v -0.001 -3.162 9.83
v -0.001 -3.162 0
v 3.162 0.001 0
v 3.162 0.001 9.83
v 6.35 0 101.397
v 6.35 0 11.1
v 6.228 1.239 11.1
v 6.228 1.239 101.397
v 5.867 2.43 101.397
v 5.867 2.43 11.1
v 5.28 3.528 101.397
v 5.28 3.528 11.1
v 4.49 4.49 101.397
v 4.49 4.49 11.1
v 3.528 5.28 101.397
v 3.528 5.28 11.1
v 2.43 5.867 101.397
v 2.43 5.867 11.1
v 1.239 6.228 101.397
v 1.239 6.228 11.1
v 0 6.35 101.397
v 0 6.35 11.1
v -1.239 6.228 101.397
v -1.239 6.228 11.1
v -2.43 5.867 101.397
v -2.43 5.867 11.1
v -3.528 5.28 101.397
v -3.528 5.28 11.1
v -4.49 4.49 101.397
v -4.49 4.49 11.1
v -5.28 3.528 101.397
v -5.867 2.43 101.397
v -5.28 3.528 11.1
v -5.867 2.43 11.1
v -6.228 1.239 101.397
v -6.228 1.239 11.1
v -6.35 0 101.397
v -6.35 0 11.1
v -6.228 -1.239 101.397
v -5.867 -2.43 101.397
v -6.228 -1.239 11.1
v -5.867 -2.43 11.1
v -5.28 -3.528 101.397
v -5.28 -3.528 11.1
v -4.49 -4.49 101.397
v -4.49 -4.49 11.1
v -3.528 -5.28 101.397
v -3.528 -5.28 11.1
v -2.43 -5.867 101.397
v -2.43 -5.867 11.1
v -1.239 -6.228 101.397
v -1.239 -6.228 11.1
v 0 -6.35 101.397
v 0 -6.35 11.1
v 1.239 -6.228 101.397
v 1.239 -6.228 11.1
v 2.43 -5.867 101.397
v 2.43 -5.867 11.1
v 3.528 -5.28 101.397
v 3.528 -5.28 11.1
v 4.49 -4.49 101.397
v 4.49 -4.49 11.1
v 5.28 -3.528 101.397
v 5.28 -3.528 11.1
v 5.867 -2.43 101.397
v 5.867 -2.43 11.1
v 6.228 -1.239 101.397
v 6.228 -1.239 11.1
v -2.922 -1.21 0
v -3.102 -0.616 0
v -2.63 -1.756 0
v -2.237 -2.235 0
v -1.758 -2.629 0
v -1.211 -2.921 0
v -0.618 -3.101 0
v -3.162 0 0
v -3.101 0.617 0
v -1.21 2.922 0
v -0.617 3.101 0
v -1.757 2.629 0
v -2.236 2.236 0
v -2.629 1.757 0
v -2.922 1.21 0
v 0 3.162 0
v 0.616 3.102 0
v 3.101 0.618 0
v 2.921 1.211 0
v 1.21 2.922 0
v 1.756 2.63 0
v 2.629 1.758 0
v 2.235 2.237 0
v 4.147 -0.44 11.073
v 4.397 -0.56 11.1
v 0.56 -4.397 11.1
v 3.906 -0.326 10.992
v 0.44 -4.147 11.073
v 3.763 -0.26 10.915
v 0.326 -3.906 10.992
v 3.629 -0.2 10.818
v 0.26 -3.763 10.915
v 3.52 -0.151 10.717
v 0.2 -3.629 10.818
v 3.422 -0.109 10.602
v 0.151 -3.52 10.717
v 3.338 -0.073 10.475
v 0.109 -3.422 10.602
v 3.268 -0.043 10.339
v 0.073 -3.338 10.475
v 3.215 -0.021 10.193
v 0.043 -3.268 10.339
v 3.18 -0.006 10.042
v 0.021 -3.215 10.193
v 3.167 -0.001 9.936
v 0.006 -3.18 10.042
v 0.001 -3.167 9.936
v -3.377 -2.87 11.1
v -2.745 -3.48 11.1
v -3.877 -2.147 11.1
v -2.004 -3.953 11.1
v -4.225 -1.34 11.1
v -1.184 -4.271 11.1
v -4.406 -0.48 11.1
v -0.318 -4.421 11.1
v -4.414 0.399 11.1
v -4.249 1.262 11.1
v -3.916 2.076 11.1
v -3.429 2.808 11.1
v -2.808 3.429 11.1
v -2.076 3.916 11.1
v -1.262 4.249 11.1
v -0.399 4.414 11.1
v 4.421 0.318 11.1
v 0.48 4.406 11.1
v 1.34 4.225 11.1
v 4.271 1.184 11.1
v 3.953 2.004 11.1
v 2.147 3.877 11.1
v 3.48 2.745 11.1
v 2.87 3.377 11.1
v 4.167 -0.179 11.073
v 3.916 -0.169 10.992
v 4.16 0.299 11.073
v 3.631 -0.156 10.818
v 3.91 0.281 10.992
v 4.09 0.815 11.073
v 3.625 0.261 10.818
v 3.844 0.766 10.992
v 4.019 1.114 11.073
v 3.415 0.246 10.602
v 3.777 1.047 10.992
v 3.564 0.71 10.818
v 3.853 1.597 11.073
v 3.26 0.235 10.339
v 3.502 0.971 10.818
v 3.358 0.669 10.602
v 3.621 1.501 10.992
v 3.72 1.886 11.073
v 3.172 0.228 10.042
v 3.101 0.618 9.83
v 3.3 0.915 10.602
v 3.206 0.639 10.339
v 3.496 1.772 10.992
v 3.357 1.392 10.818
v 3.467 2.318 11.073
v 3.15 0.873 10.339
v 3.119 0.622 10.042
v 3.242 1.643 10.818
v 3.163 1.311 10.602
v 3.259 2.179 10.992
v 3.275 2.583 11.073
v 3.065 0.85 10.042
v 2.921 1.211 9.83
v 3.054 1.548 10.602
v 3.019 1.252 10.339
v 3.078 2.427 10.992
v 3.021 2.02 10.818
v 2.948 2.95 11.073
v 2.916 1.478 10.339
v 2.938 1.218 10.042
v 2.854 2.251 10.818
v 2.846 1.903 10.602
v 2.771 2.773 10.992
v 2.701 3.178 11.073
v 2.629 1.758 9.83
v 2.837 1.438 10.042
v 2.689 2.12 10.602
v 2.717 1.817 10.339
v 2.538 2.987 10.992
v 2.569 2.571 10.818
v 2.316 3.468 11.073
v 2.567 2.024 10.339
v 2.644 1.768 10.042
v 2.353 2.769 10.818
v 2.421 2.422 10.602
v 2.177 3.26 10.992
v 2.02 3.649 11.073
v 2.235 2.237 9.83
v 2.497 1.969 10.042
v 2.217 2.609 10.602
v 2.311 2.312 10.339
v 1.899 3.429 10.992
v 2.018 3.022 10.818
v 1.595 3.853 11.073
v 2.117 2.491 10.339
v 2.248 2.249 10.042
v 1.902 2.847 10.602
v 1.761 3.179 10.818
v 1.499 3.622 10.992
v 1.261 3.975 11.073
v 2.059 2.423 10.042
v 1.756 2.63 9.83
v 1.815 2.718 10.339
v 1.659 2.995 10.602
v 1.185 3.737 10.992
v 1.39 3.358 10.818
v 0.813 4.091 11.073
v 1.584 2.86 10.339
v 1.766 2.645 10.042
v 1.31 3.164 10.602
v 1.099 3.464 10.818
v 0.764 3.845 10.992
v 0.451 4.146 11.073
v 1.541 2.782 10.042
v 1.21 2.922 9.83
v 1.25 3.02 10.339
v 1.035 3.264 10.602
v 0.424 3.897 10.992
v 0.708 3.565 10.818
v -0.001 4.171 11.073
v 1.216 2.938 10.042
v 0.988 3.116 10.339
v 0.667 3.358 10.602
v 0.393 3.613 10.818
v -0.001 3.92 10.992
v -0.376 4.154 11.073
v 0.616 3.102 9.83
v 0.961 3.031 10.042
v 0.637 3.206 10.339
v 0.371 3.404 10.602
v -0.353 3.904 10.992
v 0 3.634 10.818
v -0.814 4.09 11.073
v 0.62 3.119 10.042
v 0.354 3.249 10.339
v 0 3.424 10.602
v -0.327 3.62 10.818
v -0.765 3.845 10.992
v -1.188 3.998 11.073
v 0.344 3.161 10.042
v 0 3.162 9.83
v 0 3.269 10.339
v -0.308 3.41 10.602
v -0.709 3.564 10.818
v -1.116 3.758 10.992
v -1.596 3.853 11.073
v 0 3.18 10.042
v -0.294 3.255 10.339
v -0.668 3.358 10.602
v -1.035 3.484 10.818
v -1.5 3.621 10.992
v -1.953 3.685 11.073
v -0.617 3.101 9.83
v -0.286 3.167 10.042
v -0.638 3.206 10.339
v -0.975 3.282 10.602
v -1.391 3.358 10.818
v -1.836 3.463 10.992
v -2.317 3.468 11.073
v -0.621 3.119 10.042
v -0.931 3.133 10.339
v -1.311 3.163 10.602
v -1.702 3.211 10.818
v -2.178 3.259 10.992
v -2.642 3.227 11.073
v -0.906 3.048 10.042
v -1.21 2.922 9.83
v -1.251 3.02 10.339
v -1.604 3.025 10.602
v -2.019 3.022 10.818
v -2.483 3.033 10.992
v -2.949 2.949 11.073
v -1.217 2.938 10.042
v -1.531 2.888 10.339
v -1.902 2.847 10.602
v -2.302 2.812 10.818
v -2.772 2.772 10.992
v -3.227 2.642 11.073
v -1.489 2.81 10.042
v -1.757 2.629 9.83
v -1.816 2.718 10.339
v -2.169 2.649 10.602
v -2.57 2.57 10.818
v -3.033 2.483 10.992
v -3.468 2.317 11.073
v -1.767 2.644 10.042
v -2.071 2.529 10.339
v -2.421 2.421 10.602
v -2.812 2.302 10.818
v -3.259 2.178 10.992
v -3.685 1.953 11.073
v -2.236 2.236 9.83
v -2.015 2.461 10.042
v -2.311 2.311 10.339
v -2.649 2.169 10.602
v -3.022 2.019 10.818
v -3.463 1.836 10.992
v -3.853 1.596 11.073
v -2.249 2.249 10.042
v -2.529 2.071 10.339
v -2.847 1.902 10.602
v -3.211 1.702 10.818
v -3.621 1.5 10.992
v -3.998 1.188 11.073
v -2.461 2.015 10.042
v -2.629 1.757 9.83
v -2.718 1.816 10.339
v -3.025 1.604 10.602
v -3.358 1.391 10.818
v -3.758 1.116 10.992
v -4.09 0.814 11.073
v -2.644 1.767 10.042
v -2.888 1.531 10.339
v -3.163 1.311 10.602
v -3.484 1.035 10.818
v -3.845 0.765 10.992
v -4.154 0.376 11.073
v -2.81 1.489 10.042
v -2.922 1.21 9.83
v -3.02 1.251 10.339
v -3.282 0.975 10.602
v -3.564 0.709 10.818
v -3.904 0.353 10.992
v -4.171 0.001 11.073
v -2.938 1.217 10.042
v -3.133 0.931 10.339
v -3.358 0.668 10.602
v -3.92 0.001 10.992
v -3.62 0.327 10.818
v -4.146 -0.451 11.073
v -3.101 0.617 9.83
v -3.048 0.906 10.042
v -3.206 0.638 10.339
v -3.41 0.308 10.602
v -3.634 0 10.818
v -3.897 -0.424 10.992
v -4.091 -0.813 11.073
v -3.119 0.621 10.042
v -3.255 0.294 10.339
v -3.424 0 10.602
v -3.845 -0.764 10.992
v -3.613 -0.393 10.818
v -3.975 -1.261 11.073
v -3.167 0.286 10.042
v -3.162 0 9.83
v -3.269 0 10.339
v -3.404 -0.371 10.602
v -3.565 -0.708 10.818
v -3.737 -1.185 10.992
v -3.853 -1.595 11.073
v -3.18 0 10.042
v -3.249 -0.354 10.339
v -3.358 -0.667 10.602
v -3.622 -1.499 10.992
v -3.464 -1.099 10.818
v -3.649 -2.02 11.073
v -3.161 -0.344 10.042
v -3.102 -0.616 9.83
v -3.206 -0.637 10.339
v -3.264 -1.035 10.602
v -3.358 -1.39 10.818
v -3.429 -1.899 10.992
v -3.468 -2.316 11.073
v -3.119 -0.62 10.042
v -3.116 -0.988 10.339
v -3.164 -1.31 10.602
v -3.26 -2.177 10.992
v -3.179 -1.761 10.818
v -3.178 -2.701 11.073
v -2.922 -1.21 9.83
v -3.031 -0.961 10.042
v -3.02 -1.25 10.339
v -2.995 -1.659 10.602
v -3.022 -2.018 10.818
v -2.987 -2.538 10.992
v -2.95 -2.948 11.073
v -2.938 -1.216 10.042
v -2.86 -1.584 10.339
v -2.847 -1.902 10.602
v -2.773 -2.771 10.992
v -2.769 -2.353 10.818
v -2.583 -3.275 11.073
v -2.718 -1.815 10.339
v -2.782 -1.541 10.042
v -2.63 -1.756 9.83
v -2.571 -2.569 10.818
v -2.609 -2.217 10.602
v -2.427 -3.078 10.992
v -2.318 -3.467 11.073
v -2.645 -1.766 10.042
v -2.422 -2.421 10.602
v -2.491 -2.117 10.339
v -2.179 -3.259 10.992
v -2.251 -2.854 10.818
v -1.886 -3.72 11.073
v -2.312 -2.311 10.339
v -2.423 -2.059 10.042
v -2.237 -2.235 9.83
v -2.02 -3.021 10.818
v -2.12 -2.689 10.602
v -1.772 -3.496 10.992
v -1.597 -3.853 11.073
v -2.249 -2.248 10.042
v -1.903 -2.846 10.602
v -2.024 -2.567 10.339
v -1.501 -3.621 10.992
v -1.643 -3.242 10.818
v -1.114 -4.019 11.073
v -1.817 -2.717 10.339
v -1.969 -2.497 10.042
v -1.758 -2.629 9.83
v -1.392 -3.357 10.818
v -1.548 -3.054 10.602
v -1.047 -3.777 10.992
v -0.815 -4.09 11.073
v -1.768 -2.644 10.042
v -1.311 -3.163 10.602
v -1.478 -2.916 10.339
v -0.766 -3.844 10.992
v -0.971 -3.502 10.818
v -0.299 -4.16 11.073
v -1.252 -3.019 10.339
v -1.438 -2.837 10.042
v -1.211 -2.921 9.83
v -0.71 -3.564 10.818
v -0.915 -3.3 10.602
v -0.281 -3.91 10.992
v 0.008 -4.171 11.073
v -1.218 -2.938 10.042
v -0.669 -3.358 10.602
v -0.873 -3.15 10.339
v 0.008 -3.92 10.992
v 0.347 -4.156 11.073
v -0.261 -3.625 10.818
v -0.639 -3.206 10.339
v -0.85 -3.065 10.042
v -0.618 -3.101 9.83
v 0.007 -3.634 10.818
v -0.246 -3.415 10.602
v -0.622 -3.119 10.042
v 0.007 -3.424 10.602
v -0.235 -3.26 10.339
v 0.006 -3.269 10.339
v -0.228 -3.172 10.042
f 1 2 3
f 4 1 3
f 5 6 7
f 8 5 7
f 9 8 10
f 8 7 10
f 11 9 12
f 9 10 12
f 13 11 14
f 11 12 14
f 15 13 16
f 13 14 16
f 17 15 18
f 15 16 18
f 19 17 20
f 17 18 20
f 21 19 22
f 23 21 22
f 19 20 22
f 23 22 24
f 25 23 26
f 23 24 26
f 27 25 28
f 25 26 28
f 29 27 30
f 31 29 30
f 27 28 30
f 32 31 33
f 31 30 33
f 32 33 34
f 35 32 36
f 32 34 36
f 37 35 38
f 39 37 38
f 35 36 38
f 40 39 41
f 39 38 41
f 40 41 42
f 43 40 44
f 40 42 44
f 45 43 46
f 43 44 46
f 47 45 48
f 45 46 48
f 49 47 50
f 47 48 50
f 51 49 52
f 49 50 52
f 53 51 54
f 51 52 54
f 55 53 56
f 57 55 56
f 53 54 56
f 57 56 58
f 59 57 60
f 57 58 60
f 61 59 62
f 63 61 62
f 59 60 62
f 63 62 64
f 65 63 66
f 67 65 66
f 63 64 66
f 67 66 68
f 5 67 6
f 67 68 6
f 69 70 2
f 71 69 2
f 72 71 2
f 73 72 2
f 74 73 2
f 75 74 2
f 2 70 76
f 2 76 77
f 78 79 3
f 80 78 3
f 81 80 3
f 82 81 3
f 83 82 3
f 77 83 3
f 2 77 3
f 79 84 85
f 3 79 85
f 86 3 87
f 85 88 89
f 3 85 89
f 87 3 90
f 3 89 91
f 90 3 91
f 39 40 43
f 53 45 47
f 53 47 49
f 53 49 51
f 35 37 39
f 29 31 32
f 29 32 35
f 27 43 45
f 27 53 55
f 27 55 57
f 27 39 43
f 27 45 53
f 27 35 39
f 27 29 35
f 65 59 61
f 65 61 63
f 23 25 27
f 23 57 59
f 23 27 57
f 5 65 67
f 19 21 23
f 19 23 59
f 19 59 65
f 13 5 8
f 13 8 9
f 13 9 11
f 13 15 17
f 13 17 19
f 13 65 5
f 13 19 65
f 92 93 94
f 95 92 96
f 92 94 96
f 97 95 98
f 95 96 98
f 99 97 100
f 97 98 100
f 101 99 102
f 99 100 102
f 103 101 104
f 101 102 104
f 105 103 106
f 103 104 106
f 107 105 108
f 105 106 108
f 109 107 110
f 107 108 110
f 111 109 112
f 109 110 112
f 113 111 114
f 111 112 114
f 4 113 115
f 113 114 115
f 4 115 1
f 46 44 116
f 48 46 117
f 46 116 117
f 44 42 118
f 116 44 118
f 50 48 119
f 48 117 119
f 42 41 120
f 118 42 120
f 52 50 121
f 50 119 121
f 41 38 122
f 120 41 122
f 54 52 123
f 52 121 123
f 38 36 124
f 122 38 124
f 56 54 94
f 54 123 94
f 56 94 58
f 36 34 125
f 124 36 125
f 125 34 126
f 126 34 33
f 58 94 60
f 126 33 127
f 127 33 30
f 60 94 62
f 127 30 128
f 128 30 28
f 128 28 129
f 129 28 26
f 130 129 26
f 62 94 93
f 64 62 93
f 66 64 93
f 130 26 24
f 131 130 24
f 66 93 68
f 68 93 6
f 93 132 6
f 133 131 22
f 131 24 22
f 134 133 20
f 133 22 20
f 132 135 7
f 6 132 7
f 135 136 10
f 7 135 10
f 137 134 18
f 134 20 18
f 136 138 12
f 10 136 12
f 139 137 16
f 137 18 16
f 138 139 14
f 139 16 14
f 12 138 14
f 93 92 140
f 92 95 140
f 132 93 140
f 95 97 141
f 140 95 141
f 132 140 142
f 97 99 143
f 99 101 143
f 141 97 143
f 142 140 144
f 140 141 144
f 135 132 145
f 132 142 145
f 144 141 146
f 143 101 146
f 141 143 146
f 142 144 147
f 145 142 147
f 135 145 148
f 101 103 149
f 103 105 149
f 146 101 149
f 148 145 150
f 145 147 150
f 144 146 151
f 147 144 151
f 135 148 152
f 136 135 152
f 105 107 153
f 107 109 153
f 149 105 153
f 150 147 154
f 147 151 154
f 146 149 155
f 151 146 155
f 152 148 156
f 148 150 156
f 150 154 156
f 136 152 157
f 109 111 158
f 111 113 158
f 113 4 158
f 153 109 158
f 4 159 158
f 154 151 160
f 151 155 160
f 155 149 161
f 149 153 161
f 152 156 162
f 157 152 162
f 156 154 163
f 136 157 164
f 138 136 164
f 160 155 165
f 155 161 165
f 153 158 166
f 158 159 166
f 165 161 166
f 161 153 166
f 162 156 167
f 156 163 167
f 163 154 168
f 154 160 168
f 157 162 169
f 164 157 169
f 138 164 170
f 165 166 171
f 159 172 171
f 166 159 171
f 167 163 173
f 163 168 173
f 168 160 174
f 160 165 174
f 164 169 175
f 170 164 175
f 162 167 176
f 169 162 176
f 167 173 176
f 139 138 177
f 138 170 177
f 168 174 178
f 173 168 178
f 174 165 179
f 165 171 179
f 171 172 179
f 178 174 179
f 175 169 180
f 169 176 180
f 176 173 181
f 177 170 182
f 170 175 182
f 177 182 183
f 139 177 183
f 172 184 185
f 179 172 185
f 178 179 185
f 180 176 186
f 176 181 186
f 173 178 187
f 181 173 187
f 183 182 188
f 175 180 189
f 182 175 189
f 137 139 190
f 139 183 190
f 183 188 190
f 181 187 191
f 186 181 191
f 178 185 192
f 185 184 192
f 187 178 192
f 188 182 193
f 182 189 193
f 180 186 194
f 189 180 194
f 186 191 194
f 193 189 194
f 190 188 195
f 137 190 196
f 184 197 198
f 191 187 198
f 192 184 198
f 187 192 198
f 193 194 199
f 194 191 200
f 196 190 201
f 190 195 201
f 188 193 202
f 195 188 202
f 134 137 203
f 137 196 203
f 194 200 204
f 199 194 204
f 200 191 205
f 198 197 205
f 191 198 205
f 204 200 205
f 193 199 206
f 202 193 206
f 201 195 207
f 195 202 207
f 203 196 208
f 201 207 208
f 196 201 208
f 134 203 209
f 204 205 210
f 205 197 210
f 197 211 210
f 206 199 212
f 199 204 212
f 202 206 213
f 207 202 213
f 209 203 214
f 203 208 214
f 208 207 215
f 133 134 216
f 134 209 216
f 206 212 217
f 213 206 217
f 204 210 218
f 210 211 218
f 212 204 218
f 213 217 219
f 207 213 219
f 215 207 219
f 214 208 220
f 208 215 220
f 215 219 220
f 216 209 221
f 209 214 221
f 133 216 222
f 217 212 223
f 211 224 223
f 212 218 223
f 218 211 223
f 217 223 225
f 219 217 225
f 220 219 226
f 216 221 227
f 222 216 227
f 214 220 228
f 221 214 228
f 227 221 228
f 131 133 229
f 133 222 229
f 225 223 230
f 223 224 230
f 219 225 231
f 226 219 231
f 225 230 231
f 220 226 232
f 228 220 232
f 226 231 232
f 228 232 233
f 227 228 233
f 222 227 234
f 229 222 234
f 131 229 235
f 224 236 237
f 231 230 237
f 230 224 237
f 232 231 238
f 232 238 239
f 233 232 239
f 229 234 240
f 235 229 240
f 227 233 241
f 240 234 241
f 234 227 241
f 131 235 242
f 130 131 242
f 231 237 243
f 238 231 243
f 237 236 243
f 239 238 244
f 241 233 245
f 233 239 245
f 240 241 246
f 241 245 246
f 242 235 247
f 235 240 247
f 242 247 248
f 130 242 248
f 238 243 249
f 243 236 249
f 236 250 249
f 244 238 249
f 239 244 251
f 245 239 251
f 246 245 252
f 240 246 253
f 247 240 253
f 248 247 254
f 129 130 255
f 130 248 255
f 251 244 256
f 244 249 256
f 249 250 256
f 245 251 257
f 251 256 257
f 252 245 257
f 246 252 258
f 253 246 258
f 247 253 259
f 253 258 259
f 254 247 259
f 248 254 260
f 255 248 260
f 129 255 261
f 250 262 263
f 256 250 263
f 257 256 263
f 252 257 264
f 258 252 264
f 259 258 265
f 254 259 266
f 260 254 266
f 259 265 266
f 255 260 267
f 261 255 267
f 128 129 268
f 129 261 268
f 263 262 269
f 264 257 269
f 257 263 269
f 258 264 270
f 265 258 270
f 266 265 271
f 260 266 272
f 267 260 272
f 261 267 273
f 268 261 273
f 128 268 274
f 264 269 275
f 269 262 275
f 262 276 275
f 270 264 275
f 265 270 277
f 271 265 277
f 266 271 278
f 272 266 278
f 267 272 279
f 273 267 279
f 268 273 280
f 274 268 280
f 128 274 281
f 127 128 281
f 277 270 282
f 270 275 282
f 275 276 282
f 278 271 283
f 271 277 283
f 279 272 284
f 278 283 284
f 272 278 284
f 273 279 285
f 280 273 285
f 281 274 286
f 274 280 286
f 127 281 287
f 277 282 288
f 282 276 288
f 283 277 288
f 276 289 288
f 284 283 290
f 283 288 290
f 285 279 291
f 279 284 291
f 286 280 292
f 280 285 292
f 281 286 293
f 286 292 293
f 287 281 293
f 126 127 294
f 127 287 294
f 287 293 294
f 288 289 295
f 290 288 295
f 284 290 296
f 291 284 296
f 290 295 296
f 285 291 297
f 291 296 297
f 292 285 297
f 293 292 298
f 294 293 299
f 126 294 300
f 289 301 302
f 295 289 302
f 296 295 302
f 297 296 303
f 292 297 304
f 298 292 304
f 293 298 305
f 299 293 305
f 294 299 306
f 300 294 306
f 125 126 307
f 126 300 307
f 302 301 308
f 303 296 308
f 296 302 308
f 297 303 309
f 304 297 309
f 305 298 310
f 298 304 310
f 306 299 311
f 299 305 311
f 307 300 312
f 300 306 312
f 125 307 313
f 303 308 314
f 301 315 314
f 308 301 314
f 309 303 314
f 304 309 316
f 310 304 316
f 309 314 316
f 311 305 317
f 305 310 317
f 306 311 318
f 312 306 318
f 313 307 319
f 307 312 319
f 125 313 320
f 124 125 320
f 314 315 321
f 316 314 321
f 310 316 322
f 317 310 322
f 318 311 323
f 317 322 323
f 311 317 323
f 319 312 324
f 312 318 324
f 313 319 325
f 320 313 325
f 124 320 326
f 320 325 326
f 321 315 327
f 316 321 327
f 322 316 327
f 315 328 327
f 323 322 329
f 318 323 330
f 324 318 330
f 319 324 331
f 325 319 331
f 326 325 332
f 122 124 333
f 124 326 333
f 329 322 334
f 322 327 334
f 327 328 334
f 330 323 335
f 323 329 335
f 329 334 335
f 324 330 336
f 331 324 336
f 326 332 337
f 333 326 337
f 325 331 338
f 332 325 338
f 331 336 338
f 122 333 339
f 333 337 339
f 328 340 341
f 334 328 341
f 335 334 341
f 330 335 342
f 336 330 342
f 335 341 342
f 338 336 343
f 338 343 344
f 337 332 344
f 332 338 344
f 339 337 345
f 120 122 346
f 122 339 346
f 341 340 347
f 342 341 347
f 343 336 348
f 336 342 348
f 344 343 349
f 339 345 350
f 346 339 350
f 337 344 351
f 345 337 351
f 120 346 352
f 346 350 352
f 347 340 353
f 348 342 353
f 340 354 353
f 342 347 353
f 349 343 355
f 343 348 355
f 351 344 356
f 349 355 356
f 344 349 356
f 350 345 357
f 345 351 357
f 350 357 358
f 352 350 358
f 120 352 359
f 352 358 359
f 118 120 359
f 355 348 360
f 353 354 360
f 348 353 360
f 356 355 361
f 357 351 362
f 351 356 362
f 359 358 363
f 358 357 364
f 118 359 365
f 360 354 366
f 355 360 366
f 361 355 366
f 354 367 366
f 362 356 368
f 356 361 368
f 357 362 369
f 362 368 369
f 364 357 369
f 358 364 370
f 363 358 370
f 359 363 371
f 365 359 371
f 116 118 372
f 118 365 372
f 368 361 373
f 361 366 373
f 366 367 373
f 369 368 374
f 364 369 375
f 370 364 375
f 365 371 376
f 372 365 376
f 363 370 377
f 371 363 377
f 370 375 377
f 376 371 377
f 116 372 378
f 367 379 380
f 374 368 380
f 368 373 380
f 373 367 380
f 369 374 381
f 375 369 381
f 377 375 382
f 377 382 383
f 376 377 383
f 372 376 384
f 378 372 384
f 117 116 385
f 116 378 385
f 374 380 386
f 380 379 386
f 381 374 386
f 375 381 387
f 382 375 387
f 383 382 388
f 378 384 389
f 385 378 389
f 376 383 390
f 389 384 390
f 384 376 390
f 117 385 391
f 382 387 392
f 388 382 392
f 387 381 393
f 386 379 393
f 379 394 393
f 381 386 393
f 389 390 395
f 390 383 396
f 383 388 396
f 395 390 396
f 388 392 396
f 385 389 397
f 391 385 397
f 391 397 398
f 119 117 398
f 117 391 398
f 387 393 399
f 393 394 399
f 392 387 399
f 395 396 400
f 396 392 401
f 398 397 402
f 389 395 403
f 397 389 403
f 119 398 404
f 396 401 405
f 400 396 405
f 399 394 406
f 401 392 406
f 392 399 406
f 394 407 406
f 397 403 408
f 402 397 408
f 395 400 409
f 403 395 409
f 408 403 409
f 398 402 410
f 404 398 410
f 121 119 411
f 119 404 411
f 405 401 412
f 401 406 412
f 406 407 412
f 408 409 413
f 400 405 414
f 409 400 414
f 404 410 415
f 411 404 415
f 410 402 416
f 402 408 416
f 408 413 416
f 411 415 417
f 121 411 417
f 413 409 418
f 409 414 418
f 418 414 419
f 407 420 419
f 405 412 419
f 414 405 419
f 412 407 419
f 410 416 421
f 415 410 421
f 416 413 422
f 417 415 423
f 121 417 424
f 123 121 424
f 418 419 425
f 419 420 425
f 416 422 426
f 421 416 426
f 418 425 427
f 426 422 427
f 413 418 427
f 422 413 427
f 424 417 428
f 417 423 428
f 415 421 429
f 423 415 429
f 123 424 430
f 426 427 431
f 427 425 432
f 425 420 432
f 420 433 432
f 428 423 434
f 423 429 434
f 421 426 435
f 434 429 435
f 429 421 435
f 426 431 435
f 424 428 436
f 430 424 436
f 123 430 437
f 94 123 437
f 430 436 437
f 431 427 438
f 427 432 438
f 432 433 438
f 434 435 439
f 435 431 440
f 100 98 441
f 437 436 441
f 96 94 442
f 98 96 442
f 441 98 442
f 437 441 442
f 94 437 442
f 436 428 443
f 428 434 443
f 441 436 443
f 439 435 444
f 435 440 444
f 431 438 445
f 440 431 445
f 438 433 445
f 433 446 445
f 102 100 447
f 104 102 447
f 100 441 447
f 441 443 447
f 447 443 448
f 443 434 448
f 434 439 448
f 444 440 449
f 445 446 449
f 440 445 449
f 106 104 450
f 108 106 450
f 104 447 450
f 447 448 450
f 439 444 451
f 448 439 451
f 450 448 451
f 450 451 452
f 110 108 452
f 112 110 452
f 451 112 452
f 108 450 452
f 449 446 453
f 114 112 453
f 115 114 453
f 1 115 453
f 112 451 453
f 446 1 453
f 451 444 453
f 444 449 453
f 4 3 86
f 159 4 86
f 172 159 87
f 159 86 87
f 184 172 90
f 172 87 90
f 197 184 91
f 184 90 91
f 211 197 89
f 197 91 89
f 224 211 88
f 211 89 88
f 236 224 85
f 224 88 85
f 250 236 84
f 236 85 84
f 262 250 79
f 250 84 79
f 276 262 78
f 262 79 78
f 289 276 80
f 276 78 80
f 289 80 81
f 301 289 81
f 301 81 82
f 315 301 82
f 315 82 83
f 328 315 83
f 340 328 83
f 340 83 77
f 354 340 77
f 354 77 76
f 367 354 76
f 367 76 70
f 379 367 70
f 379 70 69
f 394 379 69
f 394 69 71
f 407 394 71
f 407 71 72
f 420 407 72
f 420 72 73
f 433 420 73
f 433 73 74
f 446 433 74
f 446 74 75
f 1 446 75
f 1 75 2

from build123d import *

# Parameters (mm, degrees)
SKETCH1_R               = 3.1623
BOSS_EXTRUDE1_DEPTH     = 11.0998
CUT_EXTRUDE1_DEPTH      = 1
CUT_EXTRUDE1_DEPTH_BACK = 12.0998
SKETCH3_R               = 6.35
BOSS_EXTRUDE2_DEPTH     = 90.297
FILLET1_R               = 1.27


with BuildPart() as part:
    # Sketch1 → Boss-Extrude1 (new body)
    with BuildSketch(Plane.XY):
        Circle(SKETCH1_R)
    extrude(amount=BOSS_EXTRUDE1_DEPTH)

    # Sketch2 → Cut-Extrude1 (cut, two sides)
    with BuildSketch(Plane(origin=(0, 0, 0), x_dir=(-1, 0, 0), z_dir=(0, 0, -1))) as cut_extrude1_sk:
        Polygon((17.073178183, -20.234228338), (0.001249598, -3.162299753), (-3.162299753, 0.001249598), (-20.234228338, 17.073178183), (-54.378085507, -17.070678986), (-17.070678986, -54.378085507), align=None)
    extrude(amount=CUT_EXTRUDE1_DEPTH, mode=Mode.SUBTRACT)
    extrude(cut_extrude1_sk.sketch, amount=-CUT_EXTRUDE1_DEPTH_BACK, mode=Mode.SUBTRACT)

    # Sketch3 → Boss-Extrude2 (add)
    with BuildSketch(Plane.XY.offset(11.0998)):
        Circle(SKETCH3_R)
    extrude(amount=BOSS_EXTRUDE2_DEPTH)

    # Fillet1
    fillet1_edges = [part.edges().sort_by_distance(p)[0] for p in [
        (-2.236083774, 2.236083774, 11.0998),
        (1.580525077, -1.580525077, 11.0998),
    ]]
    fillet(fillet1_edges, radius=FILLET1_R)


solid = part.part
